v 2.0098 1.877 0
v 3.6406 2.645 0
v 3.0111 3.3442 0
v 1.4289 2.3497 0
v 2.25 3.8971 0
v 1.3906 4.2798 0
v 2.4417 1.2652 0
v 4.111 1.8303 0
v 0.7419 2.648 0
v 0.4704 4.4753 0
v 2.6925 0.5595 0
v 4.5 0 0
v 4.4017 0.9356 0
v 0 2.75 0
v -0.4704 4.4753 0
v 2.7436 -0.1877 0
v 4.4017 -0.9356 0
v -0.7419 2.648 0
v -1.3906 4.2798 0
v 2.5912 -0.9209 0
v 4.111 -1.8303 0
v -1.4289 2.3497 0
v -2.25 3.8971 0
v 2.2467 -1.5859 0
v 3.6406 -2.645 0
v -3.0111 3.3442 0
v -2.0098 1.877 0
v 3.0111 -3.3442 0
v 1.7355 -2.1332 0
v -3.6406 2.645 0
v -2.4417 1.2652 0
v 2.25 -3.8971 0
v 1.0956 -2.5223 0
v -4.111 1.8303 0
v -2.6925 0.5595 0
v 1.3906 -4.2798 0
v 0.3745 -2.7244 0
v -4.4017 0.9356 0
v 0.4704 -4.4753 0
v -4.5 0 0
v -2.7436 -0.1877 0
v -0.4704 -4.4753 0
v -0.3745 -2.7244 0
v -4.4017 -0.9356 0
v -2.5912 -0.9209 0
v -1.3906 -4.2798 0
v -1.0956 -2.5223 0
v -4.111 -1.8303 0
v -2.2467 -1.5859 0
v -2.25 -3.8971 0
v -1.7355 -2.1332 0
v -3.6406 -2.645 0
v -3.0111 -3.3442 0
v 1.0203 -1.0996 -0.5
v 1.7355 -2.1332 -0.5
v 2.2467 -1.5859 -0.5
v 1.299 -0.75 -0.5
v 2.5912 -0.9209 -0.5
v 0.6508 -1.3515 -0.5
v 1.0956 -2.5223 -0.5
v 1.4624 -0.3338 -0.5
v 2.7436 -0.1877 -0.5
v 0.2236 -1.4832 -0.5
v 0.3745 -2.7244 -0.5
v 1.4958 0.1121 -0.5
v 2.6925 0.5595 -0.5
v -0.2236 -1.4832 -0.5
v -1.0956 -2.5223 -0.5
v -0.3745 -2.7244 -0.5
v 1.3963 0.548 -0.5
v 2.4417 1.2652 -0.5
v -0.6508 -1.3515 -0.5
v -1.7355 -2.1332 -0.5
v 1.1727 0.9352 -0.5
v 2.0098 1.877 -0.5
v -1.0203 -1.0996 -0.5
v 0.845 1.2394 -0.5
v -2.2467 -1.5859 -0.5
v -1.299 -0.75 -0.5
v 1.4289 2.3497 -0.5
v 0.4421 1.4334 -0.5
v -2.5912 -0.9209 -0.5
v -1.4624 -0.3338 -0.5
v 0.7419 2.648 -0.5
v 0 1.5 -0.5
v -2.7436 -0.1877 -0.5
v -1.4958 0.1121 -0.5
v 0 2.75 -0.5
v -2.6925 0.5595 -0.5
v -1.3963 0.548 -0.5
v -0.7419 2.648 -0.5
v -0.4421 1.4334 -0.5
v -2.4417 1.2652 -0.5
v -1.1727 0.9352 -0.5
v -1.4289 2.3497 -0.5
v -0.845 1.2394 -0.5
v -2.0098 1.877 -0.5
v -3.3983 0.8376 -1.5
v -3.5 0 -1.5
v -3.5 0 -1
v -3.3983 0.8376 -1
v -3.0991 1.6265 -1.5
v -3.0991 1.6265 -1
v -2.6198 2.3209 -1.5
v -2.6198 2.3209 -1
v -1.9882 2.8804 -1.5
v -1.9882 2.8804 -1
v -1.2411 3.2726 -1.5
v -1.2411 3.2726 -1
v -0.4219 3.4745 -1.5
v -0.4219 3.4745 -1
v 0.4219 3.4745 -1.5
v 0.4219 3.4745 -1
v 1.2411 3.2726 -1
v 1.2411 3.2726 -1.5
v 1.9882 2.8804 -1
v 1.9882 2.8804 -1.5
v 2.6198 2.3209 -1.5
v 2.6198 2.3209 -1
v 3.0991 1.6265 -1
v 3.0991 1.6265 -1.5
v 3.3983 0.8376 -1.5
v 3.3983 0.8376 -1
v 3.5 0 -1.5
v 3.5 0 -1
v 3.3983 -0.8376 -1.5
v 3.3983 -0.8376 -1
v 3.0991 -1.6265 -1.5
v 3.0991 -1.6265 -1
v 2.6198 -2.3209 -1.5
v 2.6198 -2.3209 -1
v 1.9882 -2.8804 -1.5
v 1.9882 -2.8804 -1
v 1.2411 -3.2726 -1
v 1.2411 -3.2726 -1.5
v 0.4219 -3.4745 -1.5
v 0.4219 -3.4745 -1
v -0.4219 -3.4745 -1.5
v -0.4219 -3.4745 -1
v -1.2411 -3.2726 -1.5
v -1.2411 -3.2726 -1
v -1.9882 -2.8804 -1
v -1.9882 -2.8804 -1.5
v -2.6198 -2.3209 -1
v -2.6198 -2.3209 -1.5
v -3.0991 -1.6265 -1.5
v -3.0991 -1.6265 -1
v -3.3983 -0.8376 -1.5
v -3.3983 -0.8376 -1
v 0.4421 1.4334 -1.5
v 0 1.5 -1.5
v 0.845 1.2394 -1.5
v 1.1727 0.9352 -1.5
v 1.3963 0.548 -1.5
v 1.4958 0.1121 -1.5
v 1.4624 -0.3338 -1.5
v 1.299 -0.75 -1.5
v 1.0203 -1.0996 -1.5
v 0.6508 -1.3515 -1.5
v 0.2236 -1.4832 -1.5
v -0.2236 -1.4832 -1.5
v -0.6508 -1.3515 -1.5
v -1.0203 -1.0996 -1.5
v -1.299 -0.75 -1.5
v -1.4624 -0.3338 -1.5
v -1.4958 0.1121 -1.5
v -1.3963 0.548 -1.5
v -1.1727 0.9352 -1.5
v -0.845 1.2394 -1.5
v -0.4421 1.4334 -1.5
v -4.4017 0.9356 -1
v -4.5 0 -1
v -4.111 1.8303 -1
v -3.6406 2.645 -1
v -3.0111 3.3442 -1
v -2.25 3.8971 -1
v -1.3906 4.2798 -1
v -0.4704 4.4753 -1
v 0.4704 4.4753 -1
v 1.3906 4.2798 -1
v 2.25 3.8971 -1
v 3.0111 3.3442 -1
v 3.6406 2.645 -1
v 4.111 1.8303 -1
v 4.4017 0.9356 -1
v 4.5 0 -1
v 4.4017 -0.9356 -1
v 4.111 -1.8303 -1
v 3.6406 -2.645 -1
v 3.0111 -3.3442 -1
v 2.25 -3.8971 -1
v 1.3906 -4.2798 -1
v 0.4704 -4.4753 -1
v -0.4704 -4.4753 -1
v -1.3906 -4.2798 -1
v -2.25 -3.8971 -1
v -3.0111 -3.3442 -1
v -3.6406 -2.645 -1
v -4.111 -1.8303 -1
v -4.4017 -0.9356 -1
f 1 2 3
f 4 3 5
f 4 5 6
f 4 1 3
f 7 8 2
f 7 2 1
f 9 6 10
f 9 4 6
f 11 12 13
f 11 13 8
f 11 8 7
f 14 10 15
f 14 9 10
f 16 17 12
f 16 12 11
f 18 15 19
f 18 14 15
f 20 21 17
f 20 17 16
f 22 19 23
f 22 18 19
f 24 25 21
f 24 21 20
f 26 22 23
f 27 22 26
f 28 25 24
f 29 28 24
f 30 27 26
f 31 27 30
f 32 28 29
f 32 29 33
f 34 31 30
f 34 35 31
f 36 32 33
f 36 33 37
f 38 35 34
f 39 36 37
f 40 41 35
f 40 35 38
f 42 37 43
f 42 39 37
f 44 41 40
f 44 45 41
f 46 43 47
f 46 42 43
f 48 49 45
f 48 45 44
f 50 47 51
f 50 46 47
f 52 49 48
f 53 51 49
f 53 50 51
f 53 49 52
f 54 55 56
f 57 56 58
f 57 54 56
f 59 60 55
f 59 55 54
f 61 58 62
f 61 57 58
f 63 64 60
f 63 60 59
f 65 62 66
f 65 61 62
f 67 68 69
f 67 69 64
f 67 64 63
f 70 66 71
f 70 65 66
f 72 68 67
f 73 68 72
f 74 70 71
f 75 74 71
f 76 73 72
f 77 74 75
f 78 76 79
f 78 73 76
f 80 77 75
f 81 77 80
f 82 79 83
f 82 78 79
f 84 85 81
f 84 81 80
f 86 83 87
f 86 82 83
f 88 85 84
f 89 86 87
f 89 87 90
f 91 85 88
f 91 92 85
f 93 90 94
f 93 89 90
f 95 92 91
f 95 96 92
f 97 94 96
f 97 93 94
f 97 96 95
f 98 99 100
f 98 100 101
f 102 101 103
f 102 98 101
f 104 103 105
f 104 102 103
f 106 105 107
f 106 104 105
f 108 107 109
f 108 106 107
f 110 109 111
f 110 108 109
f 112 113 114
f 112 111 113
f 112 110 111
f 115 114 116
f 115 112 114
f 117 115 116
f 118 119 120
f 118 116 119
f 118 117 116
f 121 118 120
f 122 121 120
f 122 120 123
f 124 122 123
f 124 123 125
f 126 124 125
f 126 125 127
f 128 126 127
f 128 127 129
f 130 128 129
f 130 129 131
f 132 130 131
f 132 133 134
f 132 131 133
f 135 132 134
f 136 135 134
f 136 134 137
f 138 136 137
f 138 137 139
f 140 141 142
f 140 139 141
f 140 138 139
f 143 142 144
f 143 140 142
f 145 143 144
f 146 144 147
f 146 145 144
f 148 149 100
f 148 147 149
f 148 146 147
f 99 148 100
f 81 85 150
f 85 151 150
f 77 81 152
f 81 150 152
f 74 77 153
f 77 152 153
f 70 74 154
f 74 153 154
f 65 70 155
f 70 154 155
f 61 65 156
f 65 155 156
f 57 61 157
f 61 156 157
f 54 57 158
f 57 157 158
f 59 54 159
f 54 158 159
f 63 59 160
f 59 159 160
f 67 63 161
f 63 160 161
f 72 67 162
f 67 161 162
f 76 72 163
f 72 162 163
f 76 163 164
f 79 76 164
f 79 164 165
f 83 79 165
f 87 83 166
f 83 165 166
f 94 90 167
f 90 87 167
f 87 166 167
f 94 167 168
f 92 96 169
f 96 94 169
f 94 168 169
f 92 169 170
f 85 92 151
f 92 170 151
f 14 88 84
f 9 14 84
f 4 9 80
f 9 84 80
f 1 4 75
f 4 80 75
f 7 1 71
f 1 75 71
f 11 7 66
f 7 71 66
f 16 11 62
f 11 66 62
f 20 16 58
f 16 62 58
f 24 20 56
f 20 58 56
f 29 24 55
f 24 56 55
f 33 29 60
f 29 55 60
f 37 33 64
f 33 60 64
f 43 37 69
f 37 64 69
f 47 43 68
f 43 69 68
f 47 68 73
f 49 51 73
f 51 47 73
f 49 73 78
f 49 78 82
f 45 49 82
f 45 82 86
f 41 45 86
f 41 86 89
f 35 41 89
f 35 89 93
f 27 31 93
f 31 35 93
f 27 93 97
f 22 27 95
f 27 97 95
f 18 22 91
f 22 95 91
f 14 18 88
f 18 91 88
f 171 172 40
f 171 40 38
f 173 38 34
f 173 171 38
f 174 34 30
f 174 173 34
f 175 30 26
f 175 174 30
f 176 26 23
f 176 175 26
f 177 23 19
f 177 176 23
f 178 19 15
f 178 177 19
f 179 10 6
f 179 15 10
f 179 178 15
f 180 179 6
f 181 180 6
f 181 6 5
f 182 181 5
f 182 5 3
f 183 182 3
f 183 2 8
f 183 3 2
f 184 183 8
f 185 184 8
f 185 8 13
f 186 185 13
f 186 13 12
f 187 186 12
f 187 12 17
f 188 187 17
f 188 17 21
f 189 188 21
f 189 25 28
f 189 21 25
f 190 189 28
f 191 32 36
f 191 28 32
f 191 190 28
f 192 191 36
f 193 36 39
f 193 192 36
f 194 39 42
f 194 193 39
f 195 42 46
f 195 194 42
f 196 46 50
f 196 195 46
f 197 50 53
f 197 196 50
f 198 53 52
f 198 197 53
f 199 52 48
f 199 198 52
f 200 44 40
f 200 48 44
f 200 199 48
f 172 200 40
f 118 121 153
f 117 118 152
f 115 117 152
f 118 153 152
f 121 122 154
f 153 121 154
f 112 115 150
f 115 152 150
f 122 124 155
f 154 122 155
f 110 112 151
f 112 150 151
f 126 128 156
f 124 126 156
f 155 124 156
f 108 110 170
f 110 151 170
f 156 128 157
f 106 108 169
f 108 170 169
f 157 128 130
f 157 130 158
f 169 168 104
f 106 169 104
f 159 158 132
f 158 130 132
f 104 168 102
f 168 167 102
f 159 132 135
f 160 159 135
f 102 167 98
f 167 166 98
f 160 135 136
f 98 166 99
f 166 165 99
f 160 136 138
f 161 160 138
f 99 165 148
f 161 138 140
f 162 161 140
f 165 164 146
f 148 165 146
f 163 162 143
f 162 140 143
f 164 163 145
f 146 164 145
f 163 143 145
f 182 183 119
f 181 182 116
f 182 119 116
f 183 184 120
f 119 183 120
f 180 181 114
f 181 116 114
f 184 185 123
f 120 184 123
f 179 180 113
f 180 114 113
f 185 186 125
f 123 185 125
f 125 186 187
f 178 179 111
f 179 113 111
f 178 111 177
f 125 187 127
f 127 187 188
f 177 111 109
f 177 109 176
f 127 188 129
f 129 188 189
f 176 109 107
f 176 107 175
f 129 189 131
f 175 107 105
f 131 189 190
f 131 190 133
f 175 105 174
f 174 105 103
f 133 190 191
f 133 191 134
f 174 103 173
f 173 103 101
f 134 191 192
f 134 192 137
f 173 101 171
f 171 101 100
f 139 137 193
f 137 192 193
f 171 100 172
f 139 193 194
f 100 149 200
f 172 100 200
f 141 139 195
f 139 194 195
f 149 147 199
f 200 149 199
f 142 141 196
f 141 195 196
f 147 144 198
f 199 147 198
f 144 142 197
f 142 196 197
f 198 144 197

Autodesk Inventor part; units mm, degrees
ref_plane "YZ Plane" through (0, 0, 0) normal (1, 0, 0) x (0, 1, 0)
ref_plane "XZ Plane" through (0, 0, 0) normal (0, 1, 0) x (-1, 0, 0)
ref_plane "XY Plane" through (0, 0, 0) normal (0, 0, 1) x (1, 0, 0)
sketch "Skizze1" plane through (0, 0, 0) normal (0, 1, 0) x (-1, 0, 0)
  line L0 (0, 0) -> (4.5, 0)
  line L1 (4.5, 0) -> (4.5, -1)
  line L2 (4.5, -1) -> (3.5, -1)
  line L3 (3.5, -1) -> (3.5, -1.5)
  line L4 (3.5, -1.5) -> (0, -1.5)
  line L5 (0, -1.5) -> (0, 0)
  point P0 (4.5, -0.5)
  dimension "d0" = 1.5
  dimension "d1" = 0.5
  dimension "d2" = 9
  dimension "d3" = 7
revolve "Umdrehung1" add sketch "Skizze1" angle 360 about axis through (0, 0, -1.5) along (0, 0, 1)
sketch "Skizze3" plane through (0, 0, 0) normal (1, 0, 0) x (0, 1, 0)
  line L0 (0, 0) -> (2.75, 0)
  line L1 (4.5, 0) -> (-4.5, 0) projected
  line L2 (2.75, 0) -> (2.75, -0.5)
  line L3 (2.75, -0.5) -> (1.5, -0.5)
  line L4 (1.5, -0.5) -> (1.5, -1.5)
  line L5 (1.5, -1.5) -> (0, -1.5)
  line L6 (0, -1.5) -> (0, 0)
  line L7 (3.5, -1.5) -> (-3.5, -1.5) projected
  dimension "d5" = 3
  dimension "d6" = 5.5
  dimension "d7" = 0.5
revolve "Umdrehung2" cut sketch "Skizze3" angle 360 about axis through (0, 0, -1.5) along (0, 0, 1)
properties part number "Miederhalter_ventilfeder"
